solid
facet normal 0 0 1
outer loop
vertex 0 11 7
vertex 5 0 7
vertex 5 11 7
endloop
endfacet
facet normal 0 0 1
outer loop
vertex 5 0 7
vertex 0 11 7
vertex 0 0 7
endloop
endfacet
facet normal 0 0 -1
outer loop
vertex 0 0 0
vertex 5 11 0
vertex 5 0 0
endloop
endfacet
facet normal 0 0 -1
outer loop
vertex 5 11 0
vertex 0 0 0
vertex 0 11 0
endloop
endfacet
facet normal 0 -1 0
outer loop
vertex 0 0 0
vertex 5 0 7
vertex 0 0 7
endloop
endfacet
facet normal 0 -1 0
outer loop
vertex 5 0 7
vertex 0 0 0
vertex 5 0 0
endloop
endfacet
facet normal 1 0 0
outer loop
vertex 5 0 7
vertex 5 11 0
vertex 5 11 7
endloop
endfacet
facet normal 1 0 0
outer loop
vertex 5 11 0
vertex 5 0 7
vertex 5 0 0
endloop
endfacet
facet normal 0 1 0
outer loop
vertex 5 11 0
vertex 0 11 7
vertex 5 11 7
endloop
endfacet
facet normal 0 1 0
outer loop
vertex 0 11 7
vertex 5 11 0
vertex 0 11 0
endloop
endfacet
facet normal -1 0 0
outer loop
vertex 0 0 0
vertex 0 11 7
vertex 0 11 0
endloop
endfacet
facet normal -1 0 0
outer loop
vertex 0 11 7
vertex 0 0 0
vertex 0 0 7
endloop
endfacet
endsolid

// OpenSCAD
// Generated by SolidPython 1.0.1 on 2020-07-29 00:46:54


cube(size = [5, 11, 7]);
/***********************************************
*********      SolidPython code:      **********
************************************************
 
# import packages: SolidPython
from solid import *
from solid.utils import *
from itertools import chain, combinations, permutations


class Resize:

    def __init__(self, scad_file):
        self.scad_file = scad_file
        #self.scad_file = import_scad(scad_file)
        # cone/cylinder param:
        self.r1 = 0
        self.r2 = 0
        self.h = 0
        # rectangular prism param:
        self.w = 0
        self.l = 0
        # ellipse param:
        self.r = 0

    # import OpenScad code (file name corresponds to shape)


    # classify shape + parameters
    def assign(self, param1, param2, param3):
        if self.scad_file == 'cone.scad':
            self.r1 = param1
            self.r2 = param2
            self.h = param3
        elif self.scad_file == 'cylinder.scad':
            self.r1 = param1
            self.r2 = param2
            self.h = param3
        elif self.scad_file == 'rectangularPrism.scad':
            self.h = param1
            self.l = param2
            self.w = param3
        else:
            self.r = param1
            self.h = param2

    # resize parameters
    def iterate(self):
        x = range(3, 20, 2)
        i = 1
        if self.scad_file == 'cone.scad':
            tempList = list(permutations(x, 2))
            for temp in tempList:
                param1 = temp[0]
                param2 = temp[1]
                filepath = 'produced_scad_files/' + 'cone' + str(param1) + '_' + str(param2) + '_' + '.scad'
                scad_render_to_file(cylinder(h=param1, r1=param2, r2=0), filepath)

        elif self.scad_file == 'cylinder.scad':
            tempList = list(permutations(x, 3))
            for temp in tempList:
                param1 = temp[0]
                param2 = temp[1]
                filepath = 'produced_scad_files/' + 'cylinder' + str(param1) + '_' + str(param2) + '_' + '.scad'
                scad_render_to_file(cylinder(h=param1, r1=param2, r2=param2), filepath)

        elif self.scad_file == 'rectangularPrism.scad':
            tempList = list(permutations(x, 3))
            for temp in tempList:
                param1 = temp[0]
                param2 = temp[1]
                param3 = temp[2]
                filepath = 'produced_scad_files/' + 'rectangularPrism' + str(param1) + '_' + str(param2) + '_' + str(
                    param3) + '.scad'
                scad_render_to_file(cube(size=(param1, param2, param3)), filepath)

        elif self.scad_file == 'ellipse.scad':
            tempList = list(permutations(x, 4))
            for temp in tempList:
                param1 = temp[0]
                param2 = temp[1]
                param3 = temp[2]
                param4 = temp[3]
                filepath = 'produced_scad_files/' + 'ellipse' + str(param1) + '_' + str(param2) + '_' + str(param3) + '_' + str(param4) + '.scad'
                scad_render_to_file(scale([param1, param2, param3])(sphere(r=param4)), filepath)

    def render_to_scadfile(self):
        scad_render_to_file(scad, 'example.scad') 
 
************************************************/
